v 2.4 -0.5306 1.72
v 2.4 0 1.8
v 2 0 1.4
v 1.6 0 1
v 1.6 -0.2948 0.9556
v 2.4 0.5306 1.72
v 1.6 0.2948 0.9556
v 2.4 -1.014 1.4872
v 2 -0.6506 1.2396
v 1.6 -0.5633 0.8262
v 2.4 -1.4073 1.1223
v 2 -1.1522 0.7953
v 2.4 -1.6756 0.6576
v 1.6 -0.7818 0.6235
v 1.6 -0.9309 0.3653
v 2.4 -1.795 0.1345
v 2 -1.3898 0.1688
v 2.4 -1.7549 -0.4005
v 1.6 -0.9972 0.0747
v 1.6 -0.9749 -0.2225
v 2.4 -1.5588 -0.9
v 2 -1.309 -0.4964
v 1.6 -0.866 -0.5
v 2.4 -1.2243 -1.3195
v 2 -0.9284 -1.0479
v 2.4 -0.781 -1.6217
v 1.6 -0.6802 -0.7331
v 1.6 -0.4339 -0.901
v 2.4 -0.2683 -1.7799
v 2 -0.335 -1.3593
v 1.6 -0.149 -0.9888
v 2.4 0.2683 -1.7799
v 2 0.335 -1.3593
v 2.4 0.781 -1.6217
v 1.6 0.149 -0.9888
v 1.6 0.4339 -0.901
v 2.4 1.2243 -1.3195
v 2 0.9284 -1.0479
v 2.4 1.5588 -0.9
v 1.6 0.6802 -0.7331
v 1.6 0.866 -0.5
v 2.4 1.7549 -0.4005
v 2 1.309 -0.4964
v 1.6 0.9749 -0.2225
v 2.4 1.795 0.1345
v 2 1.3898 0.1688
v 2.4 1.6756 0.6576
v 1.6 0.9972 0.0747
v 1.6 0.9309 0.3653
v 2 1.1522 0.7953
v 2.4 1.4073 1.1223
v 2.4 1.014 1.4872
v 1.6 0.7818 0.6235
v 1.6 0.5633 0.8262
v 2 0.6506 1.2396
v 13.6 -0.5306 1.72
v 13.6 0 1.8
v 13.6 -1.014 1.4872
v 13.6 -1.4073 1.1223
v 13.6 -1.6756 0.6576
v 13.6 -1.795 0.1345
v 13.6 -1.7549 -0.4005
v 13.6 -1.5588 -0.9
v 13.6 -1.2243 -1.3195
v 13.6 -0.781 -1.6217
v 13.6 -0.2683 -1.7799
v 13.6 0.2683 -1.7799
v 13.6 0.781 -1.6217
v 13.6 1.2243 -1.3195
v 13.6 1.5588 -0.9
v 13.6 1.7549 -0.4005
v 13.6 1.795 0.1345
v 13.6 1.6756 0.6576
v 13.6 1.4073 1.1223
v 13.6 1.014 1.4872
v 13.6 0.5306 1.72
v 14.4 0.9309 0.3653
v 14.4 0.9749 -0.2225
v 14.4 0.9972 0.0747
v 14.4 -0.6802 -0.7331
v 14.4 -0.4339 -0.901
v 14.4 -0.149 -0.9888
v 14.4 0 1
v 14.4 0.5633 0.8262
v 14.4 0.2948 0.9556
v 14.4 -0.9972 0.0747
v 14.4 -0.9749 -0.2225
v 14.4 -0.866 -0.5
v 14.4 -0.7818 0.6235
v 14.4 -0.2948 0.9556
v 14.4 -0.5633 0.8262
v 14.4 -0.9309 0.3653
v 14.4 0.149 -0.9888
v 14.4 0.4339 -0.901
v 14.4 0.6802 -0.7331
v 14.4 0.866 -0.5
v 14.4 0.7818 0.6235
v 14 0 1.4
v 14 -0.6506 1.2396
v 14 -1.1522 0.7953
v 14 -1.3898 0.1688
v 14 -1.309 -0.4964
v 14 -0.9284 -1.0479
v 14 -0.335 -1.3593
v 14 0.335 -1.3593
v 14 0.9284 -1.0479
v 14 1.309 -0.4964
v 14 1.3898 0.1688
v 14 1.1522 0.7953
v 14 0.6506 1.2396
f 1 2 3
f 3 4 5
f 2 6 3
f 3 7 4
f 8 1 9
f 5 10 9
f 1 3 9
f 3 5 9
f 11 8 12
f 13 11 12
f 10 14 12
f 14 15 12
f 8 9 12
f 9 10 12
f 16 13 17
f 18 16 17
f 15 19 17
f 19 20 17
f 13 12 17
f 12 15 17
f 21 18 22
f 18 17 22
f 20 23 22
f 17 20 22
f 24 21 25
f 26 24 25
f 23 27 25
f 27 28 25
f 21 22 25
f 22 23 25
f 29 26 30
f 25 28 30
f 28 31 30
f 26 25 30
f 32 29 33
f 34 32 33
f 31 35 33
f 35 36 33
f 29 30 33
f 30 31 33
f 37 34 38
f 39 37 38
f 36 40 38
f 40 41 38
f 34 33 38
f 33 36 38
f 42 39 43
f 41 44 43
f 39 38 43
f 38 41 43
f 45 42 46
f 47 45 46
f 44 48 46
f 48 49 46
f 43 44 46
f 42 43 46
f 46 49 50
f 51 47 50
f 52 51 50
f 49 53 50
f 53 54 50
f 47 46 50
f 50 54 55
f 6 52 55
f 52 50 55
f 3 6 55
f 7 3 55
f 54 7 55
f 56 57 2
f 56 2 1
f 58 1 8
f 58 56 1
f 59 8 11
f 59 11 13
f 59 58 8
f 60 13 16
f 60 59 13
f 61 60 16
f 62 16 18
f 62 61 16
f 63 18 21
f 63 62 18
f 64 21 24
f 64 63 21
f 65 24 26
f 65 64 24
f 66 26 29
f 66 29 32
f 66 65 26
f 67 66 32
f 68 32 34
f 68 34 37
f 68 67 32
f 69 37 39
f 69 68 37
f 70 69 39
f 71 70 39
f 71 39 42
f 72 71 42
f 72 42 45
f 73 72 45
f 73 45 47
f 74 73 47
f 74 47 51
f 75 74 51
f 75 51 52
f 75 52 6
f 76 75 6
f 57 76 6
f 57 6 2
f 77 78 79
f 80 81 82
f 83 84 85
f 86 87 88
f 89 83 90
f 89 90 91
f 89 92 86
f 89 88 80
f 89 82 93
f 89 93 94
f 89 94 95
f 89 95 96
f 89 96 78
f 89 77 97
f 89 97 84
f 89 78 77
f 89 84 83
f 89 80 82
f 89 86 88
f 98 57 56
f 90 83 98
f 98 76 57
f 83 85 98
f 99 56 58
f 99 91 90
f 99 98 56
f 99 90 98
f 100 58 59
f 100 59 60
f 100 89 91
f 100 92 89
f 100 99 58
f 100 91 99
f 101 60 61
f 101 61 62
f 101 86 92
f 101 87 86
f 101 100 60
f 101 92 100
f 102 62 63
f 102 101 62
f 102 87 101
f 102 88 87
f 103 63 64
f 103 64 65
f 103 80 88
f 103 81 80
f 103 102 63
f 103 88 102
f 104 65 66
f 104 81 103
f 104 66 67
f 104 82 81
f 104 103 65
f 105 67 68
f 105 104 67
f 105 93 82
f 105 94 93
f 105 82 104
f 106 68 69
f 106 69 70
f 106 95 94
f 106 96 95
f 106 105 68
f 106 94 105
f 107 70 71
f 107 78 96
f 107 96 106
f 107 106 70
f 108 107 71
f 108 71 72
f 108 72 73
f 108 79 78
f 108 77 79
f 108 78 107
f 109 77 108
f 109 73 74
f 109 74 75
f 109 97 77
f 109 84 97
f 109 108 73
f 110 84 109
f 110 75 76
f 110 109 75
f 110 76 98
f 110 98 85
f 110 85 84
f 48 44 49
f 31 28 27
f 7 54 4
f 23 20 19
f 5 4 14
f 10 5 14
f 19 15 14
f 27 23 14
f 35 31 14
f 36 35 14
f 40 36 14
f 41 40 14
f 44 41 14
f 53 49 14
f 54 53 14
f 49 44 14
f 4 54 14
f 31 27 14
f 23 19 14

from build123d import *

# Parameters (mm, degrees)
SWEEP1_PROFILE_R = 2.25
CHAMFER1_SIZE    = 1
SCALE1_SCALE     = 0.8


with BuildPart() as part:
    # Sweep1: sweep along a path in Sketch1
    with BuildLine(Plane.XY) as sweep1_path:
        Line((0, 0), (16, 0))
    # Sweep1 profile (on start of the path) → Sweep1 (sweep)
    with BuildSketch(Plane(origin=(0, 0, 0), x_dir=(0, 0, 1), z_dir=(1, 0, 0))):
        Circle(SWEEP1_PROFILE_R)
    sweep(path=sweep1_path.line)

    # Chamfer1
    chamfer1_edges = [part.edges().sort_by_distance(p)[0] for p in [
        (0, 0, -2.25),
        (16, 0, -2.25),
    ]]
    chamfer(chamfer1_edges, length=CHAMFER1_SIZE)


with BuildPart() as part_1:
    # Scale1: scaled about (8, 0, 0)
    add(part.part.scale(SCALE1_SCALE).moved(Location((1.6, 0, 0))))


solid = part_1.part
